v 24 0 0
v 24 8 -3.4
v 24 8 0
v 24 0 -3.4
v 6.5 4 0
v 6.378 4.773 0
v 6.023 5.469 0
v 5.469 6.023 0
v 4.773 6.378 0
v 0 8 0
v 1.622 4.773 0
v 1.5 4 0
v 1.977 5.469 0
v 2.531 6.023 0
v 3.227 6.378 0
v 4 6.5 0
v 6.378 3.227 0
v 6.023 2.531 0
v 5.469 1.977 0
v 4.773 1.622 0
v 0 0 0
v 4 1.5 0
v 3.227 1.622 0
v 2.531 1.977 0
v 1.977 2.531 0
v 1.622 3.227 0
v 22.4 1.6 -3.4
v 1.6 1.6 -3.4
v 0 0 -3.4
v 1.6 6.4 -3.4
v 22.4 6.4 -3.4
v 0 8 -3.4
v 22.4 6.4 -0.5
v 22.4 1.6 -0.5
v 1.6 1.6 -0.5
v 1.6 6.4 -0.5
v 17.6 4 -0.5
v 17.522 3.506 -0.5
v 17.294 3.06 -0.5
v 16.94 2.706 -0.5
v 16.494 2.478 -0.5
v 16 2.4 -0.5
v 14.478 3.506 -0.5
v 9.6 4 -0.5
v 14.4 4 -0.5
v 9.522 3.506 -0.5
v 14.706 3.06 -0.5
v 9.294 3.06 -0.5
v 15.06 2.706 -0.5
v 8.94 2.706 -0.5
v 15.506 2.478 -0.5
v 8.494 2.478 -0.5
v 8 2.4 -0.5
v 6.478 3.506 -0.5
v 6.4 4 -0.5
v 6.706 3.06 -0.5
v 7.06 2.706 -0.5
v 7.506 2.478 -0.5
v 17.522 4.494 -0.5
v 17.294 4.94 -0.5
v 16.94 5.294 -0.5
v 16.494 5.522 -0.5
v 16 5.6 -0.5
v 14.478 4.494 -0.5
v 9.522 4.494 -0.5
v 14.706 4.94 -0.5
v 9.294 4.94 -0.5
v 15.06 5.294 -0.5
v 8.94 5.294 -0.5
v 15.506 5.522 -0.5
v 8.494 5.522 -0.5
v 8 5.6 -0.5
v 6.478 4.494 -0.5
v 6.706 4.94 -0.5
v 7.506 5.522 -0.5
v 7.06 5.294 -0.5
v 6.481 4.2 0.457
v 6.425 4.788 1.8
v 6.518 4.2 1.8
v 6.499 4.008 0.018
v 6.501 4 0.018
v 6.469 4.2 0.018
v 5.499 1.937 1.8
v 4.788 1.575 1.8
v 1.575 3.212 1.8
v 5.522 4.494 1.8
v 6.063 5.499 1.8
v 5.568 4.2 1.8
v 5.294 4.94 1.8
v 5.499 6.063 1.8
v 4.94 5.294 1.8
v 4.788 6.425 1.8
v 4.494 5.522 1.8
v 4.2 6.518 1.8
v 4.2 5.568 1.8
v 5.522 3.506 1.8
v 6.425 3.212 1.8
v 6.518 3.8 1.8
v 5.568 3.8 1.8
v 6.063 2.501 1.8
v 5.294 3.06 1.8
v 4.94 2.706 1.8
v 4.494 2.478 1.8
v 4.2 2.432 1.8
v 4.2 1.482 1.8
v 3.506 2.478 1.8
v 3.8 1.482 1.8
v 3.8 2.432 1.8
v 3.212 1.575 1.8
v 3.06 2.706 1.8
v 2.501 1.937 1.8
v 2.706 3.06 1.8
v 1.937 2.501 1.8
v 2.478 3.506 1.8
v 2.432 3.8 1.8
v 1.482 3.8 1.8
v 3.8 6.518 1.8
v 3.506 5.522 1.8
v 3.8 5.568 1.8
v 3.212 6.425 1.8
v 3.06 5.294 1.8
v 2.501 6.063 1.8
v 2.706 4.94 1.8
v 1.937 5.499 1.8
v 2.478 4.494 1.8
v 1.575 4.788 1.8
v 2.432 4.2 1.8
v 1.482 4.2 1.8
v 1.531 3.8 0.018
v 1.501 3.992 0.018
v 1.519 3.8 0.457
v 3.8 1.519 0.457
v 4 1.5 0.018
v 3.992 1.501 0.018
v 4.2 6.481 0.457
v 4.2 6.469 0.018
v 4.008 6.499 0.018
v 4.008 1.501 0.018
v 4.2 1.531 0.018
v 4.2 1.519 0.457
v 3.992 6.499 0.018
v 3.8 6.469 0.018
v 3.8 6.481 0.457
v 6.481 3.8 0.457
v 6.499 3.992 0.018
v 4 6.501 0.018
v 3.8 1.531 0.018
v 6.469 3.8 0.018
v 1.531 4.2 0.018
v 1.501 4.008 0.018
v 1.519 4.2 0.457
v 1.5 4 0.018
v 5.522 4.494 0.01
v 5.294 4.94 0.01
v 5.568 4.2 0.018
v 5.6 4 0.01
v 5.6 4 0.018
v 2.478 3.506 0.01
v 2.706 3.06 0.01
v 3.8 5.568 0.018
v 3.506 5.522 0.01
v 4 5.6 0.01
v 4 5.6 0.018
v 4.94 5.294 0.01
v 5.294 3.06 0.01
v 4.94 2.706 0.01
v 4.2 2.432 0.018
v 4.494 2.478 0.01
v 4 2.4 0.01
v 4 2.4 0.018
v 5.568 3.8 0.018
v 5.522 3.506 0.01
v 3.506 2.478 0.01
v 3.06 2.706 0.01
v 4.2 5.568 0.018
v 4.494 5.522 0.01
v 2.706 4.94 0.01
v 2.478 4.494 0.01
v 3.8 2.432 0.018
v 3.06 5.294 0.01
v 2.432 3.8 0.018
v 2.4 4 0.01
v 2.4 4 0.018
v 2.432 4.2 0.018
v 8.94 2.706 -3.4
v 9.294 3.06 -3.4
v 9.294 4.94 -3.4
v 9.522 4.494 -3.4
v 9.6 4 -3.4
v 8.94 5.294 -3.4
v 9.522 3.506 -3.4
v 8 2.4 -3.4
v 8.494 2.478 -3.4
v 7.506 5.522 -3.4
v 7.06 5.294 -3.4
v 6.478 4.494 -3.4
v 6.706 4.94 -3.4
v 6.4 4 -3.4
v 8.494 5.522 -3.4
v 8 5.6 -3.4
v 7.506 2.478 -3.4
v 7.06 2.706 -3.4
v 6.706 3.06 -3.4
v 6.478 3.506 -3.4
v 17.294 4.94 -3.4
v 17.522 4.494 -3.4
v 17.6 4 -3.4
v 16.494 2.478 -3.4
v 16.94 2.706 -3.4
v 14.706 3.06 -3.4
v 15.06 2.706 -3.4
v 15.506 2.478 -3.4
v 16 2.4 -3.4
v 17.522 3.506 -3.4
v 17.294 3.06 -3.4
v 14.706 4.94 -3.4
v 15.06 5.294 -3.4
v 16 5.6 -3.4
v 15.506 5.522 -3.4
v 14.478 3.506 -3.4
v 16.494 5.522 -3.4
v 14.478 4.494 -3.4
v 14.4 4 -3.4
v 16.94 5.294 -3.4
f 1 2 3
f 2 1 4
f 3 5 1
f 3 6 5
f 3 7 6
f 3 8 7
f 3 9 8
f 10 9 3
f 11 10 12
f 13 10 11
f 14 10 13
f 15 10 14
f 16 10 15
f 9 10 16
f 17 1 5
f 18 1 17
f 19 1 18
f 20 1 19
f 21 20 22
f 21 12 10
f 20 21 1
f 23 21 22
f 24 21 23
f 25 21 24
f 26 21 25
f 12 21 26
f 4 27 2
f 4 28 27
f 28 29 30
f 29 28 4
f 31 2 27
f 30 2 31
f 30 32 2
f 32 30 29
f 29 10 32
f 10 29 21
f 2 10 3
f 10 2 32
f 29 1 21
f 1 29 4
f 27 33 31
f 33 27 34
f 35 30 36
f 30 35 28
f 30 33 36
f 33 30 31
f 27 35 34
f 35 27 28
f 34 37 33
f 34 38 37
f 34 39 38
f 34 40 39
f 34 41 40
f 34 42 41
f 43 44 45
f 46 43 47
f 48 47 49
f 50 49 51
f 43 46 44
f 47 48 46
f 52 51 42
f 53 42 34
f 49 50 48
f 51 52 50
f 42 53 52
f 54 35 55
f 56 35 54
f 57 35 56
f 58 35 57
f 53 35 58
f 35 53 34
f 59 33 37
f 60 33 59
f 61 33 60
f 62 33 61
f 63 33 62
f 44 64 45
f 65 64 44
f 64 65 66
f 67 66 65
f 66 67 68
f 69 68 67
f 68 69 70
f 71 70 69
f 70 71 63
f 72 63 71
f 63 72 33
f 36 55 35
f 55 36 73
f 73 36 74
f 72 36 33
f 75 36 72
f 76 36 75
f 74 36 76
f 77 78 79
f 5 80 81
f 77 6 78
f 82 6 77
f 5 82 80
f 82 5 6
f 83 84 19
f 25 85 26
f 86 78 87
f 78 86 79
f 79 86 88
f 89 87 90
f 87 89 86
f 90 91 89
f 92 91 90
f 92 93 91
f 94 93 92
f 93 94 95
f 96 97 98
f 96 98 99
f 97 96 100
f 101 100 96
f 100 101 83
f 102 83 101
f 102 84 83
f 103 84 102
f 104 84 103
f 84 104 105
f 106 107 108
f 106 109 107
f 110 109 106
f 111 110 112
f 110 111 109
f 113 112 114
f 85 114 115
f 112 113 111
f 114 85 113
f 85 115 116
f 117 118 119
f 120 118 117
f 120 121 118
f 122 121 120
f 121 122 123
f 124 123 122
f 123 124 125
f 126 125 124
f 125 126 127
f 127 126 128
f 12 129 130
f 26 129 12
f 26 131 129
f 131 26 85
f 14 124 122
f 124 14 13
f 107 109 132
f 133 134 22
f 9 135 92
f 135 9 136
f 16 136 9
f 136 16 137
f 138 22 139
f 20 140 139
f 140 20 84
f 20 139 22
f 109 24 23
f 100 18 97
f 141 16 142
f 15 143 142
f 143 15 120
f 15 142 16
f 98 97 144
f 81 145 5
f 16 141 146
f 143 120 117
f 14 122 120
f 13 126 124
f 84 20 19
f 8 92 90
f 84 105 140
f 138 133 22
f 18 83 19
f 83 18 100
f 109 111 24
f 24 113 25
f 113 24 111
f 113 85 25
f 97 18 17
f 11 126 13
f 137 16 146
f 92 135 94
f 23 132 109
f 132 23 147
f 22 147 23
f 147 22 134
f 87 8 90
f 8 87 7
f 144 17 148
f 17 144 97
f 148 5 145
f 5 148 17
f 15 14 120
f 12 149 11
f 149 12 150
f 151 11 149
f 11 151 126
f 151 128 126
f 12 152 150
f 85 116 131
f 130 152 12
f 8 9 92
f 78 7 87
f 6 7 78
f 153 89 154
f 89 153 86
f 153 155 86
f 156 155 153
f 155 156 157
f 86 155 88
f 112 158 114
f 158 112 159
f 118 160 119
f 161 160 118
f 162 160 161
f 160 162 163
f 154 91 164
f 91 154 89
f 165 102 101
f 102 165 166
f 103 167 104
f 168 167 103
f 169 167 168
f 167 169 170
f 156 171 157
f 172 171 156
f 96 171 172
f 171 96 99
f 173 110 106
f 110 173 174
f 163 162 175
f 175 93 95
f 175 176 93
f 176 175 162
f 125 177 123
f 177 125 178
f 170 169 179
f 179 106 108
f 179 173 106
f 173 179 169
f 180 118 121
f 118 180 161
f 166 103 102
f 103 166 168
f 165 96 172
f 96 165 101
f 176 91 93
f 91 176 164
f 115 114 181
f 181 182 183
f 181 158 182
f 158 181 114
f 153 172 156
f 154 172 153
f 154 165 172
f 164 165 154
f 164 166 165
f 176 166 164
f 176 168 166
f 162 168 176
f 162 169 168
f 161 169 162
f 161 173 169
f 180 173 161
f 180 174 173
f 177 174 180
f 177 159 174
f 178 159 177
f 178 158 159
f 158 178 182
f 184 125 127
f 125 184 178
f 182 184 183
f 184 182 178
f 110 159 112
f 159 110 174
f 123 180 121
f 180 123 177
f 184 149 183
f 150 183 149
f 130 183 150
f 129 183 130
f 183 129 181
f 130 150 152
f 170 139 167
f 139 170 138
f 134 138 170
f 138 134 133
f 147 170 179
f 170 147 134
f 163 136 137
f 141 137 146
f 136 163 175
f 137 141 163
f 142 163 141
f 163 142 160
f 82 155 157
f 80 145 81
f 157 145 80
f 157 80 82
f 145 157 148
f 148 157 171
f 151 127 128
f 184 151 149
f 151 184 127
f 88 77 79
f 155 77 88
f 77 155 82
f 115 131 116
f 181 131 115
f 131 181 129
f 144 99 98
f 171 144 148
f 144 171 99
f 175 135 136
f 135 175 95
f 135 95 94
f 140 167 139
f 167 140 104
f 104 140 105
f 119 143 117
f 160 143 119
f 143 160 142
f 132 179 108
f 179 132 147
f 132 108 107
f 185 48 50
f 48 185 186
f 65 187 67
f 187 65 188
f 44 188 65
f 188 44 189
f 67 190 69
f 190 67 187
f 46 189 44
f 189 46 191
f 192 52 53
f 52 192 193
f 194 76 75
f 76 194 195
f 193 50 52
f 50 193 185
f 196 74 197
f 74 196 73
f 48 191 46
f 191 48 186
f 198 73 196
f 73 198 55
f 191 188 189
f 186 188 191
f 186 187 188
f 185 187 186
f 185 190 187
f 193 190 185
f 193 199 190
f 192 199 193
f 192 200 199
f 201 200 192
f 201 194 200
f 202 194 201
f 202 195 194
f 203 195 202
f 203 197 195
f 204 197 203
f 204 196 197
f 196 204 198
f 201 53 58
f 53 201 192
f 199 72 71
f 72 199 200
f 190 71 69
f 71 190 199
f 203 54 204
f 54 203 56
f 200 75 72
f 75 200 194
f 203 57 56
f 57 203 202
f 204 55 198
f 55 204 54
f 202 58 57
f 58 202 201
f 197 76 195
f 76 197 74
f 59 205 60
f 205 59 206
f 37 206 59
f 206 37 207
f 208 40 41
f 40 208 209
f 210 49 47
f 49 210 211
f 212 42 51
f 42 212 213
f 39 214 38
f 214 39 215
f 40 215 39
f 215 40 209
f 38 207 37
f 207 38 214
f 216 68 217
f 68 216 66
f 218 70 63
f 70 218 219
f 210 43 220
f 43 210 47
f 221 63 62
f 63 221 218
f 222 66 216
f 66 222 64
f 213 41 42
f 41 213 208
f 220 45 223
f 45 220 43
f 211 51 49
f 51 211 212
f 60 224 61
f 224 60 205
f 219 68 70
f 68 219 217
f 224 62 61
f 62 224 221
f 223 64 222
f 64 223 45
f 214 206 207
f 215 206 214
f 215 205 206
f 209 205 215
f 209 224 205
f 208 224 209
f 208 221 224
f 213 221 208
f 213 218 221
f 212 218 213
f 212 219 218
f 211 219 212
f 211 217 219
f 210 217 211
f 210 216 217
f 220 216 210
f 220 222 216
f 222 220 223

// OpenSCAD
//https://bricks.stackexchange.com/questions/288/what-are-the-dimensions-of-a-lego-brick


L = 1.6; // A lego unit is 1.6mm

// bricks that are exactly the width of the stud pitch (8mm) fit
// to tightly in practice, so bricks are slightly shaved down
// PLAY is _half_ the amount of space between bricks

// TODO implement play (be sure to keep brick centered)
PLAY = .1 / L; 

// divide by L to convert mm to Lego units
// cheats use positive numbers for MORE PLASTIC
// cheats use negative numbers for LESS PLASTIC

PLATE_HEIGHT = 2;
BRICK_HEIGHT = 6;
STUD_HEIGHT = 1.8 / L;
LID_HEIGHT = .5 / L;

CHEAT_HEIGHT = .2 / L;
CHEAT_CEILING = -.5 / L; // 
CHEAT_STUD_OD = .2 / L;
CHEAT_STUD_OD_TOP = .3 / L;

CHEAT_ROUND_OD = .1 / L;



////////////////////////////////////
// studs

module stud() {
    $fn = 20;

    color("blue")
    translate([2.5, 2.5, 0]) // align center to grid
    translate([0,0, STUD_HEIGHT * .5 ]) // align bottom t0 0
    cylinder(h = STUD_HEIGHT, d1 = 3 + CHEAT_STUD_OD, d2 = 3 + CHEAT_STUD_OD_TOP , center  = true);
}

module tstud() {
    $fn = 20;

    difference()
    {
        stud();
        translate([2.5 , 2.5 ,0]) // align center to grid
        translate([0, 0, STUD_HEIGHT * .51 ]) // align bottom to 0
        cylinder(h = STUD_HEIGHT + .01 , d = 2 , center  = true);
    }
}


module sstud() {
    $fn = 20;

    difference()
    {
        tstud();
        translate([2.5, 2.5, STUD_HEIGHT * .51])
        {
            cube([10, .25, STUD_HEIGHT], center = true);
            cube([.25, 10, STUD_HEIGHT], center = true);
        }
    }
}


////////////////////////////////////
// antistuds

module antistud(h = 2) {
    $fn = 20;
    ch = h +CHEAT_HEIGHT;
    translate([2.5, 2.5, 0]) // align center to grid
    translate([0,0, -.5 * ch ]) // align top to 0
    difference() {
        cylinder(h = ch, d = 4.07 + CHEAT_ROUND_OD, center  = true);
        cylinder_outer(ch + .01, 1.5, $fn); // account for circle/poly error
    }
}

module santistud(h = 2) {
    ch = h +CHEAT_HEIGHT;
    difference(){
        antistud(h);
        
        translate([2.5, 2.5, 0]) // align center to grid
        translate([0,0, -.5 * ch ]) // align top to 0
        {
            cube([10, .25, ch + .01], center = true);
            cube([.25, 10, ch + .01], center = true);     
        }
    }
}

module roundLid() {
    translate([2.5, 2.5, 0]) // align center to grid
    translate([0,0, LID_HEIGHT * -.5 ]) // align top to 0
    cylinder(h = LID_HEIGHT, d = 4.07 + CHEAT_ROUND_OD , center  = true);
}

module roundTile(h = PLATE_HEIGHT) {
    $fn = 20;
    
    santistud(h);

    roundLid();
    // // top
    // translate([2.5, 2.5, 0]) // align center to grid
    // translate([0,0, -.25 ]) // align top to 0
    // cylinder(h = .5, d = 4.07 + CHEAT_ROUND_OD , center  = true);
    
    // antistud();
}



////////////////////////////////////
// squares

module wall(w = 1, d = 1, h = 2) {
    cheatHeight = h + CHEAT_HEIGHT;
    difference() {
        // outer
        translate([0, 0, -cheatHeight ]) // align top
        // translate([PLAY, PLAY, 0]) // play
        cube([w * 5, d * 5, cheatHeight ]);
        
        // hollow
        translate([0, 0, -cheatHeight - .02 ]) // align top
        translate([1, 1, .01]) // center
        cube([w * 5 - 2 , d * 5 - 2 , cheatHeight + .02]);
    }
}

module lid(w = 1, d = 1) {
    translate([0, 0, -LID_HEIGHT ]) // align top
    cube([w * 5, d * 5, LID_HEIGHT ]);
}


// module brick(w = 1, d = 1){
//     tile(w, d, BRICK_HEIGHT);
// }

module tile(w = 1, d = 1, h = PLATE_HEIGHT) {
    wall(w, d, h);
    lid(w, d);
}

////////////////////////////////////
// util

module grid(w = 1, d = 1) {
    for (row = [0:w-1], col = [0:d-1]) {
        translate([row * 5, col * 5, 0]) children();
    }
}

module cylinder_outer(height,radius,fn){
    fudge = 1/cos(180/fn);
    cylinder(h=height,r=radius*fudge,$fn=fn, center = true);
}




////////////////////////////////////
// greebles

module dish(a) {
    translate([0, 0, -.2]) // merge base
    translate([2.5, 2.51, 4 ]) // position
    rotate([a, 0, 0]) // position
    {
        // antenna
        translate([0, 0, -3.5]) cylinder(h = 3.5, r1 = 1, r2= .5, $fn = 20);
        sphere(r = .5, $fn = 20);
        
        // dish
        difference() {
            sphere(d = 8, $fn = 30);
            sphere(d = 7, $fn = 30);
            translate([0, 0, 1.5]) cube([10, 10, 6], center = true);
            translate([0,0,-4]) cube([10, .25, 2.01], center = true);
            translate([0,0,-4]) cube([.25, 10, 2.01], center = true);
        }
    }
}

module dome() {
    // translate([0, 0, -.2035]) // merge base
    translate([2.5, 2.50, 0]) // position
    
    difference(){
    // antenna
   
        sphere(d = 4.07 + CHEAT_ROUND_OD, $fn = 40);
        translate([0, 0, -2]) cube([10, 10, 4], center = true);
       
    }
}

module microCity(seed) {
    
    for (row = [0:4], col = [0:4]) {
        h = floor(rands(0, 4, 1, seed*100+row*10+col)[0]) ;
        translate([row, col, 0]) cube([1, 1, h]);
    }
}

module gazebo(){
    difference() {
        union(){
            intersection() {
                translate([2.5, 2.5, 1.5])
                rotate([90, 0, 0])
                cylinder(d=5, h=5, center= true, $fn=30);

                translate([2.5, 2.5, 1.5])
                rotate([0, 90, 0])
                cylinder(d=5, h=5, center= true, $fn=30);
            }
            cube([5, 5, 1.5]);
        }

       

        translate([2.5, 2.5, 1.5])
        rotate([90, 0, 0])
            cylinder(d = 3, h = 10, center = true, $fn = 20);
       
        translate([2.5, 2.5, 1.5])
        rotate([0, 90, 0])
            cylinder(d = 3, h = 10, center = true, $fn = 20);

        translate([2.5, 2.5, .75])
            cube([3,10,1.5], center = true);
        translate([2.5, 2.5, .75])
            cube([10,3,1.5], center = true);

        translate([0,0,-1.5]) cube([5, 5, 1.5]);
    }
}

module jet() {
    difference() {
        union() {
            cylinder(d1=2, d2 = 3.1, h=1.5, $fn = 20);
            cylinder(d1=2, d2 = 3, h=2, $fn = 20);
        }
       translate([0,0,.1]) cylinder(d1=1, d2 = 2, h=2.01, $fn = 20);
    }
}
module quadJet() {
    translate([1.25, 1.25, 0])jet();
    translate([3.75, 3.75, 0])jet();
    translate([1.25, 3.75, 0])jet();
    translate([3.75, 1.25, 0])jet();
}



module mosEisleyDome() {
    hull() {
        translate([2.5, 2.5, 0])
        linear_extrude(.1)
        square(4, true);

        translate([2.5, 2.5, 2])
        linear_extrude(.1)
        square(3.5, true);
    }

    translate([2.5, 2.5, 1.8])
    sphere(1.6, $fn = 20);

    translate([2.5, 1.5, .75])
    cube([4.2, .8, 1.5], center= true);

    translate([2.5, 3.5, .75])
    cube([4.2, .8, 1.5], center= true);

    translate([1.5, 2.5, .75])
    cube([.8, 4.2, 1.5], center= true);

     translate([3.5, 2.5, .75])
    cube([.8, 4.2, 1.5], center= true);


}

module mosEisleyVat() {
    difference() {
        union() {
            difference() {
                hull() {
                    translate([2.5, 2.5, 0])
                    linear_extrude(.1)
                    square(5, true);

                    translate([2.5, 2.5, 2])
                    linear_extrude(.1)
                    square(4.5, true);
                }

                union() {
                    translate([2.5, 1.5, 3.25])
                    cube([5, .8, 3], center= true);

                    translate([2.5, 3.5, 3.25])
                    cube([5, .8, 3], center= true);

                    translate([1.5, 2.5, 3.25])
                    cube([.8, 5, 3], center= true);

                    translate([3.5, 2.5, 3.25])
                    cube([.8, 5, 3], center= true);
                }
            }


            translate([2.5, 2.5, 0])
            cylinder(d=4, h=2.4, $fn = 20);
        }

        translate([2.5, 2.5, -.01])
        cylinder(d=3, h=4, $fn = 40);
    }
}


module mosEisleyTower() {
    difference() {
        hull() {
            translate([2.5, 2.5, 0])
            linear_extrude(.1)
            square(5, true);

            translate([2.5, 2.5, 8])
            linear_extrude(.1)
            square(3.5, true);
        }
        translate([2.5, 2.5, 5])
        cube([5,5,.2], center = true);
        translate([2.5, 2.5, 2])
        cube([5,5,.2], center = true);

        translate([0, 1.5, 4])
        cube([1,1,1], center = true);

        translate([5, 1.5, 4])
        cube([1,1,1], center = true);

        translate([1.5, 0, 4])
        cube([1,1,1], center = true);

        translate([3.5, 5, 4])
        cube([1,1,1], center = true);

        translate([2.5, 0, 7])
        cube([1,2,4], center = true);

        translate([2.5, 5, 7])
        cube([1,2,4], center = true);
    }
    
    hull() {
        translate([2.5, 2.5, 0])
        linear_extrude(.1)
        square(4.5, true);

        translate([2.5, 2.5, 8])
        linear_extrude(.1)
        square(3, true);
    }
}

module fin() {
  
        hull() {
            translate([2.5, 2.5, 0])
            linear_extrude(.1)
            square([5,5], true);

            
            translate([2.5, 2.5, .6])
            // rotate([0, -5,0])
            linear_extrude(.1)
            square([4, 2], true);
        }

         hull() {
            

            translate([2.5, 2.5, .6])
            // rotate([0, -5,0])
            linear_extrude(.1)
            square([4, 2], true);

            translate([1.5, 2.5, 2.9])
            // rotate([0, -5,0])
            linear_extrude(.1)
            square([4,1], true);
        }

}


module fin2() {
  
        hull() {
            translate([2.5, 2.5, 0])
            linear_extrude(.1)
            square([5,5], true);

            
            translate([2.5, 1.5, .6])
            // rotate([0, -5,0])
            linear_extrude(.1)
            square([4, 2], true);
        }

         hull() {
            

            translate([2.5, 1.5, .6])
            // rotate([0, -5,0])
            linear_extrude(.1)
            square([4, 2], true);

            translate([1.5, .5, 2.9])
            // rotate([0, -5,0])
            linear_extrude(.1)
            square([4,1], true);
        }

}

module bump() {
    translate([0, 0, 1]) {
        
        minkowski() {
            difference() {
                cylinder(d=6, h=3, $fn = 20);
                cube([5,6,10]);
            }
            sphere(.5, $fn = 10);
        }

            minkowski() {
            difference() {
                cylinder(d=4, h=4, $fn = 20);
                rotate([90,0,0]) cube([5,6,10]);
            }
            sphere(.5, $fn = 10);
        }
        
    }
}
module podOval() {
    difference() {
        translate([2.5, 1, 0])
        rotate([90, 0, 0]) scale([1, 1, 1.25]) sphere(5, $fn = 50);
        translate([-5, -.1, 0]) cube([15, 10, 5]);
        translate([-5, 4.9, -5]) cube([15, 10, 10]);
    }
   
}

module pod() {
    difference() {
        translate([2.5, 0, 0])
        rotate([90, 0, 0]) sphere(4.9, $fn = 50);
        translate([-5, -.2, 0]) cube([15, 10, 5]);
        translate([2.5, -2.50, 0]) rotate([90,0,0]) cylinder(d=3.1, h=10, $fn = 20);
        translate([2.5, 0, -2.5]) rotate([180,0,0]) cylinder(d=3.1, h=10, $fn = 20);
        // #translate([-5, 5, -5]) cube([15, 10, 10]);
    }
   
}

module bottomFin() {
    radius = .5;
    translate([0,0,-.5]) 
    hull() linear_extrude(.5) {
        translate([2.5, 2.5, 0]) circle(d=4, $fn = 20);
        translate([7.5, 2.5, 0]) circle(d=4, $fn = 20);
    }
    difference() {
        translate([5,2.5,0]) 
        minkowski() {
            hull() {
                translate([0, 0, 0])
                linear_extrude(.1)
                square([6,.5], true);
                
                translate([-5, 0, -5])
                linear_extrude(.1)
                square([.1, .1], true);
            }
            sphere(radius, $fn = 20);
        }
        cube([10, 5, 5]);
    }

}

module sideFin() {
    difference() {
        minkowski() {
            translate([0, -6, -1.5])
                cube([4, 10, .1]);
            sphere(.5, $fn = 20);
        }

        translate([1, 1, -2.5])
        cube([3 , 3 , 2]);
    }
}

module negativeHead() {
    // units in this module are in mm
    scale(1 / L) 
    minkowski() {
        radius = 2;
        translate([0, 0, -8.3 + radius]) 
        cylinder(r=5.2 - radius, h=8.3 - 2 * radius, $fn = 20);
        sphere(r = radius, $fn = 20);
    }
}
module hat() {
    
    difference() {
        union() {
            // cap
            translate([0,0,-1.25]) 
            rotate([-10,0,0])
            difference() {
                sphere(r = 4.5, $fn = 30);
                translate([-10, -10, -10]) cube([20, 20, 10]);
            }

            // ears
            translate([3.5,0, -1.5]) rotate([0,90,0]) sphere(r = 2.0, $fn = 20);
            translate([-3.5,0, -1.5]) rotate([0,90,0]) sphere(r = 2.0, $fn = 20);
        }
    translate([0,0,-.1]) cylinder(r = 2.5, h = 2, $fn = 20);
    negativeHead();

    }
    translate([-2.5, -2.5, 2]) santistud(h = 2);

    
    
}
scale(L) {
    *hat();
    

    // translate([-2.5, -2.5, 0]) sstud();
    
    // todo: make a "low barn"
    // high barn
    *union() {
        tile();
        difference() {
            translate([0,2.5, 0])
            rotate([0, 90, 0]) 
            cylinder(r = 2.5, h = 5, $fn = 40);
            
            translate([0, 0, -5]) cube([5, 5, 5]);
        }
    }
    // moebius keel base
    *union() {
        grid(2, 1) sstud();
        translate([0,0,-1])cube([10, 5, 1]);
    }

    // moebius wing
    union(){
        tile(3, 1);
        sstud();
        color("red") 
        translate([5, 2.5, 0-(PLATE_HEIGHT+CHEAT_HEIGHT)])
        grid(2, 1)
        cylinder(r=1, h=PLATE_HEIGHT+CHEAT_HEIGHT, $fn = 20);
    }
    *union() {
        tile(2, 2, h = 2);
        color("blue")
        translate([2.5, 2.5, -.01])
        santistud(h = 1.99);
    }

    // translate([0,0,-2]) grid(2, 2) sstud();
    *union([20, 0, -2]) {
        // tile(1, 1);
        sstud();
        pod();
    }
    
   

}

// scale(L) {
//     translate([0, 0, 0]) {
//         tile();
//         mosEisleyDome();
//     }

//     translate([0, 8, 0]) {
//         wall();
//         mosEisleyVat();
//     }

//     translate([0, 16, 0]) {
//         tile();
//         mosEisleyTower();
//     }

//     translate([0, 24, 0]) {
//         tile();
//         fin();
//     }

//     translate([0, 32, 0]) {
//         tile();
//         fin2();
       
//     }

//     translate([0, 40, 0]) {
//         tile();
        
//         translate([0,5,0]) mirror([0, 1, 0]) fin2();
//     }
// }


 
